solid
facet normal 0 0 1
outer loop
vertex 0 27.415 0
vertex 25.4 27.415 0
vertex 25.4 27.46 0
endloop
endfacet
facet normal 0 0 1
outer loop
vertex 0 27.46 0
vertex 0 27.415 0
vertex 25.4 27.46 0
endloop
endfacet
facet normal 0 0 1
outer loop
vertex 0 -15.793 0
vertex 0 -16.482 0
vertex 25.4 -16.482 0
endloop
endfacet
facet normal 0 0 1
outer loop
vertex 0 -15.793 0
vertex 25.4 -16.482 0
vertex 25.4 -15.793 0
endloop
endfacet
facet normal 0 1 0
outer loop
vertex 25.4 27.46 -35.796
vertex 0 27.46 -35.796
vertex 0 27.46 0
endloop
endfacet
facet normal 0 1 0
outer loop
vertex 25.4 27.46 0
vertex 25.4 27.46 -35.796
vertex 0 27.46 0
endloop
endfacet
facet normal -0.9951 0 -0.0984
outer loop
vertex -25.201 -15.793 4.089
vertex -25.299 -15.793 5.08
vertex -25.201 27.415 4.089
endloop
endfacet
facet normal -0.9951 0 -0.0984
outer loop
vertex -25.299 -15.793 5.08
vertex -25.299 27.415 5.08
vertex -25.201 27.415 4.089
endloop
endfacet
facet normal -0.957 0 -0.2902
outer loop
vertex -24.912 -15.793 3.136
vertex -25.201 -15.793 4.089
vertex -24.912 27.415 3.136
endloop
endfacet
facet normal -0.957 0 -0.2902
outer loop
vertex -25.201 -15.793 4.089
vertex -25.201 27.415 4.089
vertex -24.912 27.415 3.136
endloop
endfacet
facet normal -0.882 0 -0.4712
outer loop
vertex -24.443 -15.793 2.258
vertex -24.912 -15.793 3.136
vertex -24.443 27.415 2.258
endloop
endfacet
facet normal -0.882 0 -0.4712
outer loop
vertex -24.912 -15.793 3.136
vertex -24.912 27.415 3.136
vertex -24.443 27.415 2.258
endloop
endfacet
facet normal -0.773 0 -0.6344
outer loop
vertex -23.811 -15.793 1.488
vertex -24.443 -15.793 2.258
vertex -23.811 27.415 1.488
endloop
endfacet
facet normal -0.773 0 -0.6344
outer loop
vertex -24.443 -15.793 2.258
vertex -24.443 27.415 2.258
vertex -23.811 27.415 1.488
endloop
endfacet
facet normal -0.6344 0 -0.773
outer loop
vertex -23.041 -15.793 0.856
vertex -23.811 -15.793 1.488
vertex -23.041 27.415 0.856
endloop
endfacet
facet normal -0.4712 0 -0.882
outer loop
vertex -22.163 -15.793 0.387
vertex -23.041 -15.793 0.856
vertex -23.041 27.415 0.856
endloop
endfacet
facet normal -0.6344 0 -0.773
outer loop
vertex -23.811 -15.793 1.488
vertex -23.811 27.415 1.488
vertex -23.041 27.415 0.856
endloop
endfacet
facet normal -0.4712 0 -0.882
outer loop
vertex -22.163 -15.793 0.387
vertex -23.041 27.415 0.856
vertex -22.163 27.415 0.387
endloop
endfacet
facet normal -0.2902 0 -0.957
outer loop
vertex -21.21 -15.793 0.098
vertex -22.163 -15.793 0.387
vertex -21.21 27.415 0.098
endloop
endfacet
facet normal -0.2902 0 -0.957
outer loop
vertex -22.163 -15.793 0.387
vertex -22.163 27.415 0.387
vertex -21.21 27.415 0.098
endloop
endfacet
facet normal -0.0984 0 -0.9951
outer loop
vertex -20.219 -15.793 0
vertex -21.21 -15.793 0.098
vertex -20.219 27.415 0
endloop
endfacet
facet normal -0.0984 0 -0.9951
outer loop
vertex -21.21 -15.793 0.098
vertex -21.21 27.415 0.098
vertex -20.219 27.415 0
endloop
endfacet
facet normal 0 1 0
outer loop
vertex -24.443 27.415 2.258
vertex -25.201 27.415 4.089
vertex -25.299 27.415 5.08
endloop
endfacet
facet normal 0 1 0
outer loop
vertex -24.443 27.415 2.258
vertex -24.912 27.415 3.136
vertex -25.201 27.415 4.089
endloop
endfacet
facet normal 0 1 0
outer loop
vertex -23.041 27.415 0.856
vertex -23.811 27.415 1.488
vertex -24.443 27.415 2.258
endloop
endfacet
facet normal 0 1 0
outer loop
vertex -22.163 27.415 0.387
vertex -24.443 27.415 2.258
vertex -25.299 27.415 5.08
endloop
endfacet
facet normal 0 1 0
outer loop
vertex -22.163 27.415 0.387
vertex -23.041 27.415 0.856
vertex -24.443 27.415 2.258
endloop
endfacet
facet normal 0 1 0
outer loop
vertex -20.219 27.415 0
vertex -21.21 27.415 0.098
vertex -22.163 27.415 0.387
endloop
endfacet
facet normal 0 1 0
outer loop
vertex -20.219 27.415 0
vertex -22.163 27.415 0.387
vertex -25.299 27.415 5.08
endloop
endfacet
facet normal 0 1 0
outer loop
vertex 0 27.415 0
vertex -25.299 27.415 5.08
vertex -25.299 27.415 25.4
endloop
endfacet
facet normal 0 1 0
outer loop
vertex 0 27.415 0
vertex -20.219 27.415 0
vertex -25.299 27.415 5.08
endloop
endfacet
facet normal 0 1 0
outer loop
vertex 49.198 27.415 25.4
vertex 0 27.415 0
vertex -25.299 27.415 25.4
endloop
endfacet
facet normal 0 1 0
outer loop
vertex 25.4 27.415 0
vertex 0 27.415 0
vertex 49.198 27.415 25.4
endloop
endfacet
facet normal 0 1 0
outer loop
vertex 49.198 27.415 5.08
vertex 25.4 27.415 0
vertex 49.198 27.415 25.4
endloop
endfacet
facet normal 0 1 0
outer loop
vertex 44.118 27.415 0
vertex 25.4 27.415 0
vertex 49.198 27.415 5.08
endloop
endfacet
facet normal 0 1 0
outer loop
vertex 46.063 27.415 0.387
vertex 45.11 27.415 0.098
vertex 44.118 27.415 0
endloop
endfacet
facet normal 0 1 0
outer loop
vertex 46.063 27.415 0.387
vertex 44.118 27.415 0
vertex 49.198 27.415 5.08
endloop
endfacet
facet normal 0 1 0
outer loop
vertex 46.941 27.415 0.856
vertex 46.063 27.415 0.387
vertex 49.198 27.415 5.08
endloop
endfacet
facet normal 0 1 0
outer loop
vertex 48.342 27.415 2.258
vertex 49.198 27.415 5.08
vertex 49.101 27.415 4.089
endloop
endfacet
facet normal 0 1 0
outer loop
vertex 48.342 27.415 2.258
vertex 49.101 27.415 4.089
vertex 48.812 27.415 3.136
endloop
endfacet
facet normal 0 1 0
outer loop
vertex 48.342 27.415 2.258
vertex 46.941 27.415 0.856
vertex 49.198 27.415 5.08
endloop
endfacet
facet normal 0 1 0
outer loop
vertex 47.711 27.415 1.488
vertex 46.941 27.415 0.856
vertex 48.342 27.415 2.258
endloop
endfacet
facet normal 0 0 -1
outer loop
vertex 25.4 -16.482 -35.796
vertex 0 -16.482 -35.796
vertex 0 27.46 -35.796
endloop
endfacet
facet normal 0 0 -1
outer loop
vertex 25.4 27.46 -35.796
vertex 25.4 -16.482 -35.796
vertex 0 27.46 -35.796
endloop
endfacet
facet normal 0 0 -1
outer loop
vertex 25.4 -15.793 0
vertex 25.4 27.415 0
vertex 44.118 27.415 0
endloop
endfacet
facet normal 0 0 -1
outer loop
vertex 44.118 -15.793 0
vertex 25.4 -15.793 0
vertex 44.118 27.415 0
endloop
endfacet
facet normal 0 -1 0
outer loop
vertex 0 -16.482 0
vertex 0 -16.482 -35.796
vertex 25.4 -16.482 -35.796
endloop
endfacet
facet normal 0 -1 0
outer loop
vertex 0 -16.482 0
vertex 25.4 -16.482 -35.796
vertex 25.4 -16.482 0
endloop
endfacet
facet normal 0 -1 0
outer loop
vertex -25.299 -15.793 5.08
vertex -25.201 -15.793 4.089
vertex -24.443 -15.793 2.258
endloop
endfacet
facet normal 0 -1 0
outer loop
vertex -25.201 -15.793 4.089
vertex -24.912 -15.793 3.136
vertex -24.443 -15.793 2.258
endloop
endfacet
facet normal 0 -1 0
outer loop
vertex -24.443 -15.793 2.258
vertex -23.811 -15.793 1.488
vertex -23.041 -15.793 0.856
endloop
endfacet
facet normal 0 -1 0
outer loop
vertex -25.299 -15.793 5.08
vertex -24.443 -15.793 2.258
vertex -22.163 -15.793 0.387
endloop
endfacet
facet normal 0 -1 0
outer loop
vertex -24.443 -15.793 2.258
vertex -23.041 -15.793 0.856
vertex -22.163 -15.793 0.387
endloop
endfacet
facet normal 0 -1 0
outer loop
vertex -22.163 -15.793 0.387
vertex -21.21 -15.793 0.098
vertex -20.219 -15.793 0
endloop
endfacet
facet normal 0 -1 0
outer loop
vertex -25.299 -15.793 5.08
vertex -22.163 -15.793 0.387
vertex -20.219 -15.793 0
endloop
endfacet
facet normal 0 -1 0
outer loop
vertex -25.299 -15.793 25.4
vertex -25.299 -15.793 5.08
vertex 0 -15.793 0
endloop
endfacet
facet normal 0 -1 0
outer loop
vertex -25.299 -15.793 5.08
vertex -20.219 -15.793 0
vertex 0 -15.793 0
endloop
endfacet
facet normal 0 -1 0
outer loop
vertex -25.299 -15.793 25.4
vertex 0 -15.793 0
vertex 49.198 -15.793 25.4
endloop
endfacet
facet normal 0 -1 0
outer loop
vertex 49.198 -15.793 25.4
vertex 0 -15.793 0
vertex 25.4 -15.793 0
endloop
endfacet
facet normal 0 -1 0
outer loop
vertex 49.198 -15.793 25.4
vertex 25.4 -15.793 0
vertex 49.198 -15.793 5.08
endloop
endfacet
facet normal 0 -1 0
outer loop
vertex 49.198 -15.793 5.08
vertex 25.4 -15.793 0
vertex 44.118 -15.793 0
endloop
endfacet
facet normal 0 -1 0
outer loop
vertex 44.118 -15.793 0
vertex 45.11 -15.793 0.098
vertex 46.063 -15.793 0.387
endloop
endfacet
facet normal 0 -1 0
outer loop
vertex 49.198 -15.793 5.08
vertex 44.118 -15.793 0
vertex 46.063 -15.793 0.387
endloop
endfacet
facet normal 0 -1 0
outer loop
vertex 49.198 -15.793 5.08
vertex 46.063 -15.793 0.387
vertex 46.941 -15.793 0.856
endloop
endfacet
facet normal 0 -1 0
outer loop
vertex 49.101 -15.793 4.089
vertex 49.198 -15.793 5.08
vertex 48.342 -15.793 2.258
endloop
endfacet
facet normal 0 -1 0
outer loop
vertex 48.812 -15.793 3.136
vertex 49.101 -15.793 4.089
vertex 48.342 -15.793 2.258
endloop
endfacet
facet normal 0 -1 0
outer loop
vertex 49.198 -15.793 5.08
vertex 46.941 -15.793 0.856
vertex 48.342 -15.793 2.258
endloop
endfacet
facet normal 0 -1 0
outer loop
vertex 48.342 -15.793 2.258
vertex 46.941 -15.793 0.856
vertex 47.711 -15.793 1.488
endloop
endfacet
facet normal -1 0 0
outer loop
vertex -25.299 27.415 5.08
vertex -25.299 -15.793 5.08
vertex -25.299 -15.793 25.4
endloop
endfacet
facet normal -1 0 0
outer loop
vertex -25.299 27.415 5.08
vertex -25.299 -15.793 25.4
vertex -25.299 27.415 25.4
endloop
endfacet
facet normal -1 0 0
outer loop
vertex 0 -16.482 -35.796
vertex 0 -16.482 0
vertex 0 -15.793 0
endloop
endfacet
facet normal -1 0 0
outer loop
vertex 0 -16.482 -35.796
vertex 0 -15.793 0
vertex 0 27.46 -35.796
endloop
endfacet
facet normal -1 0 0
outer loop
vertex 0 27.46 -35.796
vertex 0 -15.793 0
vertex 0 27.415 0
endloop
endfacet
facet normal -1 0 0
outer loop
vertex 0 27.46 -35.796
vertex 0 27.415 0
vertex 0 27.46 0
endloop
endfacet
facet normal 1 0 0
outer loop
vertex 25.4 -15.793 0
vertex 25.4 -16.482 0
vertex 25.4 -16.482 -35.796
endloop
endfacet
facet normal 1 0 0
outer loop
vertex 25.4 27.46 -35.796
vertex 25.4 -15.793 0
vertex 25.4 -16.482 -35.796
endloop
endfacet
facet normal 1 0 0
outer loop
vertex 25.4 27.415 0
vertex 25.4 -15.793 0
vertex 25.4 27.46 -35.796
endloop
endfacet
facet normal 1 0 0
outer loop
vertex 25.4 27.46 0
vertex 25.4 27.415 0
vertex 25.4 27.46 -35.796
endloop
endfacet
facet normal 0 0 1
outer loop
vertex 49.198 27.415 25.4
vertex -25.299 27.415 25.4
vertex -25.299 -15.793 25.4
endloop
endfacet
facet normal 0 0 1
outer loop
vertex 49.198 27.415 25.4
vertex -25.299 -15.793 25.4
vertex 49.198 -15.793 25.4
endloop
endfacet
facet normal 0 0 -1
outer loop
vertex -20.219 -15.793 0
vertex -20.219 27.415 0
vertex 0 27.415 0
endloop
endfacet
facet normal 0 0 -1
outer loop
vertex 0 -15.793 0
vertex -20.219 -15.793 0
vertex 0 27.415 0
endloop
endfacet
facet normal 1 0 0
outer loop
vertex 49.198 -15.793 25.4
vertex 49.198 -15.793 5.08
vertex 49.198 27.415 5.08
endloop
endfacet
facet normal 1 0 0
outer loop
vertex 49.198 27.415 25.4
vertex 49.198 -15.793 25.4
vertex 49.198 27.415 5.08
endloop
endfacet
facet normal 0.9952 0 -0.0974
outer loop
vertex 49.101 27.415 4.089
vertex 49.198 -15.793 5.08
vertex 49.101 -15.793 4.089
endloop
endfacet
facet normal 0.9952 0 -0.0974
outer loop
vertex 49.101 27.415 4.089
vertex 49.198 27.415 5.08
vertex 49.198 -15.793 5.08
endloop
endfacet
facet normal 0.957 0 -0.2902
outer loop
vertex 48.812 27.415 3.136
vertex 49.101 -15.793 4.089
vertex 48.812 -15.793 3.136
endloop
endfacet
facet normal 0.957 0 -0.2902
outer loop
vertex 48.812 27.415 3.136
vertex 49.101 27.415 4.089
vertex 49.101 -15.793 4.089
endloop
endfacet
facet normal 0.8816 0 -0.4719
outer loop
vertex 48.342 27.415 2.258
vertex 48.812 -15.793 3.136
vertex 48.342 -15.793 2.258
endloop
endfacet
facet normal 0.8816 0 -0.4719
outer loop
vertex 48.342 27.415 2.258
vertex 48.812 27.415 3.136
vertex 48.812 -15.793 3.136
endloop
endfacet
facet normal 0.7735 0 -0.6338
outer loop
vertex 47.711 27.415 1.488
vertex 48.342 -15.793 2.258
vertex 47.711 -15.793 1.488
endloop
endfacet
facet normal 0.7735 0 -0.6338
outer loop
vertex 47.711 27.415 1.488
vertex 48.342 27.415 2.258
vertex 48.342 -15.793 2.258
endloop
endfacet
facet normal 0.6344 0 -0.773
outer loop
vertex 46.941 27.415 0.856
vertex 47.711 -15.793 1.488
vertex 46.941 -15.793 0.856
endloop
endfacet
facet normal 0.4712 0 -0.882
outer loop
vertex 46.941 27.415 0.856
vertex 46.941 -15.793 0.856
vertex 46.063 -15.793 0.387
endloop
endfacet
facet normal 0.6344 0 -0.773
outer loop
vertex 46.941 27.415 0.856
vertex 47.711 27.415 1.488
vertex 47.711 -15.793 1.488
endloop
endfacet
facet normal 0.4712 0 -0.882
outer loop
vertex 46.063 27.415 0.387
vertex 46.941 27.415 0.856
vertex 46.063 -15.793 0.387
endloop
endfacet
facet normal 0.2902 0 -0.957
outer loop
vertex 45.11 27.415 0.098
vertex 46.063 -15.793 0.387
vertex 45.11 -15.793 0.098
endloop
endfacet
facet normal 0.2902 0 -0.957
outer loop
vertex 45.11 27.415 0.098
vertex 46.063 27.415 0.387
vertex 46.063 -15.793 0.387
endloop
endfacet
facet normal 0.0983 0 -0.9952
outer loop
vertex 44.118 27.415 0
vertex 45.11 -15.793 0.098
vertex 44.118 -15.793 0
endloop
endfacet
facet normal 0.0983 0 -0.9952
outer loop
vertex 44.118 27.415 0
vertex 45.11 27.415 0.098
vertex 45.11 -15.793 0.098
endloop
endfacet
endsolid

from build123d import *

# Parameters (mm, degrees)
F1_W     = 43.941932
F1_H     = 35.796363
F2_DEPTH = 25.4
F0_W     = 74.497212
F0_H     = 43.208381
F3_DEPTH = 25.4
F4_R     = 5.08
F5_R     = 5.08


with BuildPart() as f2:
    # F1 (on Right) → F2 (new body)
    with BuildSketch(Plane.YZ):
        with Locations((5.488838, -17.898181)):
            Rectangle(F1_W, F1_H)
    extrude(amount=F2_DEPTH)

    # F0 (on Top) → F3 (join)
    with BuildSketch(Plane.XY):
        with Locations((11.949877, 5.810783)):
            Rectangle(F0_W, F0_H)
    extrude(amount=F3_DEPTH)

    # F4
    f4_edges = [f2.edges().sort_by_distance(p)[0] for p in [
        (49.198483, 5.810783, 0),
    ]]
    fillet(f4_edges, radius=F4_R)

    # F5
    f5_edges = [f2.edges().sort_by_distance(p)[0] for p in [
        (-25.298729, 5.810783, 0),
    ]]
    fillet(f5_edges, radius=F5_R)


solid = f2.part
